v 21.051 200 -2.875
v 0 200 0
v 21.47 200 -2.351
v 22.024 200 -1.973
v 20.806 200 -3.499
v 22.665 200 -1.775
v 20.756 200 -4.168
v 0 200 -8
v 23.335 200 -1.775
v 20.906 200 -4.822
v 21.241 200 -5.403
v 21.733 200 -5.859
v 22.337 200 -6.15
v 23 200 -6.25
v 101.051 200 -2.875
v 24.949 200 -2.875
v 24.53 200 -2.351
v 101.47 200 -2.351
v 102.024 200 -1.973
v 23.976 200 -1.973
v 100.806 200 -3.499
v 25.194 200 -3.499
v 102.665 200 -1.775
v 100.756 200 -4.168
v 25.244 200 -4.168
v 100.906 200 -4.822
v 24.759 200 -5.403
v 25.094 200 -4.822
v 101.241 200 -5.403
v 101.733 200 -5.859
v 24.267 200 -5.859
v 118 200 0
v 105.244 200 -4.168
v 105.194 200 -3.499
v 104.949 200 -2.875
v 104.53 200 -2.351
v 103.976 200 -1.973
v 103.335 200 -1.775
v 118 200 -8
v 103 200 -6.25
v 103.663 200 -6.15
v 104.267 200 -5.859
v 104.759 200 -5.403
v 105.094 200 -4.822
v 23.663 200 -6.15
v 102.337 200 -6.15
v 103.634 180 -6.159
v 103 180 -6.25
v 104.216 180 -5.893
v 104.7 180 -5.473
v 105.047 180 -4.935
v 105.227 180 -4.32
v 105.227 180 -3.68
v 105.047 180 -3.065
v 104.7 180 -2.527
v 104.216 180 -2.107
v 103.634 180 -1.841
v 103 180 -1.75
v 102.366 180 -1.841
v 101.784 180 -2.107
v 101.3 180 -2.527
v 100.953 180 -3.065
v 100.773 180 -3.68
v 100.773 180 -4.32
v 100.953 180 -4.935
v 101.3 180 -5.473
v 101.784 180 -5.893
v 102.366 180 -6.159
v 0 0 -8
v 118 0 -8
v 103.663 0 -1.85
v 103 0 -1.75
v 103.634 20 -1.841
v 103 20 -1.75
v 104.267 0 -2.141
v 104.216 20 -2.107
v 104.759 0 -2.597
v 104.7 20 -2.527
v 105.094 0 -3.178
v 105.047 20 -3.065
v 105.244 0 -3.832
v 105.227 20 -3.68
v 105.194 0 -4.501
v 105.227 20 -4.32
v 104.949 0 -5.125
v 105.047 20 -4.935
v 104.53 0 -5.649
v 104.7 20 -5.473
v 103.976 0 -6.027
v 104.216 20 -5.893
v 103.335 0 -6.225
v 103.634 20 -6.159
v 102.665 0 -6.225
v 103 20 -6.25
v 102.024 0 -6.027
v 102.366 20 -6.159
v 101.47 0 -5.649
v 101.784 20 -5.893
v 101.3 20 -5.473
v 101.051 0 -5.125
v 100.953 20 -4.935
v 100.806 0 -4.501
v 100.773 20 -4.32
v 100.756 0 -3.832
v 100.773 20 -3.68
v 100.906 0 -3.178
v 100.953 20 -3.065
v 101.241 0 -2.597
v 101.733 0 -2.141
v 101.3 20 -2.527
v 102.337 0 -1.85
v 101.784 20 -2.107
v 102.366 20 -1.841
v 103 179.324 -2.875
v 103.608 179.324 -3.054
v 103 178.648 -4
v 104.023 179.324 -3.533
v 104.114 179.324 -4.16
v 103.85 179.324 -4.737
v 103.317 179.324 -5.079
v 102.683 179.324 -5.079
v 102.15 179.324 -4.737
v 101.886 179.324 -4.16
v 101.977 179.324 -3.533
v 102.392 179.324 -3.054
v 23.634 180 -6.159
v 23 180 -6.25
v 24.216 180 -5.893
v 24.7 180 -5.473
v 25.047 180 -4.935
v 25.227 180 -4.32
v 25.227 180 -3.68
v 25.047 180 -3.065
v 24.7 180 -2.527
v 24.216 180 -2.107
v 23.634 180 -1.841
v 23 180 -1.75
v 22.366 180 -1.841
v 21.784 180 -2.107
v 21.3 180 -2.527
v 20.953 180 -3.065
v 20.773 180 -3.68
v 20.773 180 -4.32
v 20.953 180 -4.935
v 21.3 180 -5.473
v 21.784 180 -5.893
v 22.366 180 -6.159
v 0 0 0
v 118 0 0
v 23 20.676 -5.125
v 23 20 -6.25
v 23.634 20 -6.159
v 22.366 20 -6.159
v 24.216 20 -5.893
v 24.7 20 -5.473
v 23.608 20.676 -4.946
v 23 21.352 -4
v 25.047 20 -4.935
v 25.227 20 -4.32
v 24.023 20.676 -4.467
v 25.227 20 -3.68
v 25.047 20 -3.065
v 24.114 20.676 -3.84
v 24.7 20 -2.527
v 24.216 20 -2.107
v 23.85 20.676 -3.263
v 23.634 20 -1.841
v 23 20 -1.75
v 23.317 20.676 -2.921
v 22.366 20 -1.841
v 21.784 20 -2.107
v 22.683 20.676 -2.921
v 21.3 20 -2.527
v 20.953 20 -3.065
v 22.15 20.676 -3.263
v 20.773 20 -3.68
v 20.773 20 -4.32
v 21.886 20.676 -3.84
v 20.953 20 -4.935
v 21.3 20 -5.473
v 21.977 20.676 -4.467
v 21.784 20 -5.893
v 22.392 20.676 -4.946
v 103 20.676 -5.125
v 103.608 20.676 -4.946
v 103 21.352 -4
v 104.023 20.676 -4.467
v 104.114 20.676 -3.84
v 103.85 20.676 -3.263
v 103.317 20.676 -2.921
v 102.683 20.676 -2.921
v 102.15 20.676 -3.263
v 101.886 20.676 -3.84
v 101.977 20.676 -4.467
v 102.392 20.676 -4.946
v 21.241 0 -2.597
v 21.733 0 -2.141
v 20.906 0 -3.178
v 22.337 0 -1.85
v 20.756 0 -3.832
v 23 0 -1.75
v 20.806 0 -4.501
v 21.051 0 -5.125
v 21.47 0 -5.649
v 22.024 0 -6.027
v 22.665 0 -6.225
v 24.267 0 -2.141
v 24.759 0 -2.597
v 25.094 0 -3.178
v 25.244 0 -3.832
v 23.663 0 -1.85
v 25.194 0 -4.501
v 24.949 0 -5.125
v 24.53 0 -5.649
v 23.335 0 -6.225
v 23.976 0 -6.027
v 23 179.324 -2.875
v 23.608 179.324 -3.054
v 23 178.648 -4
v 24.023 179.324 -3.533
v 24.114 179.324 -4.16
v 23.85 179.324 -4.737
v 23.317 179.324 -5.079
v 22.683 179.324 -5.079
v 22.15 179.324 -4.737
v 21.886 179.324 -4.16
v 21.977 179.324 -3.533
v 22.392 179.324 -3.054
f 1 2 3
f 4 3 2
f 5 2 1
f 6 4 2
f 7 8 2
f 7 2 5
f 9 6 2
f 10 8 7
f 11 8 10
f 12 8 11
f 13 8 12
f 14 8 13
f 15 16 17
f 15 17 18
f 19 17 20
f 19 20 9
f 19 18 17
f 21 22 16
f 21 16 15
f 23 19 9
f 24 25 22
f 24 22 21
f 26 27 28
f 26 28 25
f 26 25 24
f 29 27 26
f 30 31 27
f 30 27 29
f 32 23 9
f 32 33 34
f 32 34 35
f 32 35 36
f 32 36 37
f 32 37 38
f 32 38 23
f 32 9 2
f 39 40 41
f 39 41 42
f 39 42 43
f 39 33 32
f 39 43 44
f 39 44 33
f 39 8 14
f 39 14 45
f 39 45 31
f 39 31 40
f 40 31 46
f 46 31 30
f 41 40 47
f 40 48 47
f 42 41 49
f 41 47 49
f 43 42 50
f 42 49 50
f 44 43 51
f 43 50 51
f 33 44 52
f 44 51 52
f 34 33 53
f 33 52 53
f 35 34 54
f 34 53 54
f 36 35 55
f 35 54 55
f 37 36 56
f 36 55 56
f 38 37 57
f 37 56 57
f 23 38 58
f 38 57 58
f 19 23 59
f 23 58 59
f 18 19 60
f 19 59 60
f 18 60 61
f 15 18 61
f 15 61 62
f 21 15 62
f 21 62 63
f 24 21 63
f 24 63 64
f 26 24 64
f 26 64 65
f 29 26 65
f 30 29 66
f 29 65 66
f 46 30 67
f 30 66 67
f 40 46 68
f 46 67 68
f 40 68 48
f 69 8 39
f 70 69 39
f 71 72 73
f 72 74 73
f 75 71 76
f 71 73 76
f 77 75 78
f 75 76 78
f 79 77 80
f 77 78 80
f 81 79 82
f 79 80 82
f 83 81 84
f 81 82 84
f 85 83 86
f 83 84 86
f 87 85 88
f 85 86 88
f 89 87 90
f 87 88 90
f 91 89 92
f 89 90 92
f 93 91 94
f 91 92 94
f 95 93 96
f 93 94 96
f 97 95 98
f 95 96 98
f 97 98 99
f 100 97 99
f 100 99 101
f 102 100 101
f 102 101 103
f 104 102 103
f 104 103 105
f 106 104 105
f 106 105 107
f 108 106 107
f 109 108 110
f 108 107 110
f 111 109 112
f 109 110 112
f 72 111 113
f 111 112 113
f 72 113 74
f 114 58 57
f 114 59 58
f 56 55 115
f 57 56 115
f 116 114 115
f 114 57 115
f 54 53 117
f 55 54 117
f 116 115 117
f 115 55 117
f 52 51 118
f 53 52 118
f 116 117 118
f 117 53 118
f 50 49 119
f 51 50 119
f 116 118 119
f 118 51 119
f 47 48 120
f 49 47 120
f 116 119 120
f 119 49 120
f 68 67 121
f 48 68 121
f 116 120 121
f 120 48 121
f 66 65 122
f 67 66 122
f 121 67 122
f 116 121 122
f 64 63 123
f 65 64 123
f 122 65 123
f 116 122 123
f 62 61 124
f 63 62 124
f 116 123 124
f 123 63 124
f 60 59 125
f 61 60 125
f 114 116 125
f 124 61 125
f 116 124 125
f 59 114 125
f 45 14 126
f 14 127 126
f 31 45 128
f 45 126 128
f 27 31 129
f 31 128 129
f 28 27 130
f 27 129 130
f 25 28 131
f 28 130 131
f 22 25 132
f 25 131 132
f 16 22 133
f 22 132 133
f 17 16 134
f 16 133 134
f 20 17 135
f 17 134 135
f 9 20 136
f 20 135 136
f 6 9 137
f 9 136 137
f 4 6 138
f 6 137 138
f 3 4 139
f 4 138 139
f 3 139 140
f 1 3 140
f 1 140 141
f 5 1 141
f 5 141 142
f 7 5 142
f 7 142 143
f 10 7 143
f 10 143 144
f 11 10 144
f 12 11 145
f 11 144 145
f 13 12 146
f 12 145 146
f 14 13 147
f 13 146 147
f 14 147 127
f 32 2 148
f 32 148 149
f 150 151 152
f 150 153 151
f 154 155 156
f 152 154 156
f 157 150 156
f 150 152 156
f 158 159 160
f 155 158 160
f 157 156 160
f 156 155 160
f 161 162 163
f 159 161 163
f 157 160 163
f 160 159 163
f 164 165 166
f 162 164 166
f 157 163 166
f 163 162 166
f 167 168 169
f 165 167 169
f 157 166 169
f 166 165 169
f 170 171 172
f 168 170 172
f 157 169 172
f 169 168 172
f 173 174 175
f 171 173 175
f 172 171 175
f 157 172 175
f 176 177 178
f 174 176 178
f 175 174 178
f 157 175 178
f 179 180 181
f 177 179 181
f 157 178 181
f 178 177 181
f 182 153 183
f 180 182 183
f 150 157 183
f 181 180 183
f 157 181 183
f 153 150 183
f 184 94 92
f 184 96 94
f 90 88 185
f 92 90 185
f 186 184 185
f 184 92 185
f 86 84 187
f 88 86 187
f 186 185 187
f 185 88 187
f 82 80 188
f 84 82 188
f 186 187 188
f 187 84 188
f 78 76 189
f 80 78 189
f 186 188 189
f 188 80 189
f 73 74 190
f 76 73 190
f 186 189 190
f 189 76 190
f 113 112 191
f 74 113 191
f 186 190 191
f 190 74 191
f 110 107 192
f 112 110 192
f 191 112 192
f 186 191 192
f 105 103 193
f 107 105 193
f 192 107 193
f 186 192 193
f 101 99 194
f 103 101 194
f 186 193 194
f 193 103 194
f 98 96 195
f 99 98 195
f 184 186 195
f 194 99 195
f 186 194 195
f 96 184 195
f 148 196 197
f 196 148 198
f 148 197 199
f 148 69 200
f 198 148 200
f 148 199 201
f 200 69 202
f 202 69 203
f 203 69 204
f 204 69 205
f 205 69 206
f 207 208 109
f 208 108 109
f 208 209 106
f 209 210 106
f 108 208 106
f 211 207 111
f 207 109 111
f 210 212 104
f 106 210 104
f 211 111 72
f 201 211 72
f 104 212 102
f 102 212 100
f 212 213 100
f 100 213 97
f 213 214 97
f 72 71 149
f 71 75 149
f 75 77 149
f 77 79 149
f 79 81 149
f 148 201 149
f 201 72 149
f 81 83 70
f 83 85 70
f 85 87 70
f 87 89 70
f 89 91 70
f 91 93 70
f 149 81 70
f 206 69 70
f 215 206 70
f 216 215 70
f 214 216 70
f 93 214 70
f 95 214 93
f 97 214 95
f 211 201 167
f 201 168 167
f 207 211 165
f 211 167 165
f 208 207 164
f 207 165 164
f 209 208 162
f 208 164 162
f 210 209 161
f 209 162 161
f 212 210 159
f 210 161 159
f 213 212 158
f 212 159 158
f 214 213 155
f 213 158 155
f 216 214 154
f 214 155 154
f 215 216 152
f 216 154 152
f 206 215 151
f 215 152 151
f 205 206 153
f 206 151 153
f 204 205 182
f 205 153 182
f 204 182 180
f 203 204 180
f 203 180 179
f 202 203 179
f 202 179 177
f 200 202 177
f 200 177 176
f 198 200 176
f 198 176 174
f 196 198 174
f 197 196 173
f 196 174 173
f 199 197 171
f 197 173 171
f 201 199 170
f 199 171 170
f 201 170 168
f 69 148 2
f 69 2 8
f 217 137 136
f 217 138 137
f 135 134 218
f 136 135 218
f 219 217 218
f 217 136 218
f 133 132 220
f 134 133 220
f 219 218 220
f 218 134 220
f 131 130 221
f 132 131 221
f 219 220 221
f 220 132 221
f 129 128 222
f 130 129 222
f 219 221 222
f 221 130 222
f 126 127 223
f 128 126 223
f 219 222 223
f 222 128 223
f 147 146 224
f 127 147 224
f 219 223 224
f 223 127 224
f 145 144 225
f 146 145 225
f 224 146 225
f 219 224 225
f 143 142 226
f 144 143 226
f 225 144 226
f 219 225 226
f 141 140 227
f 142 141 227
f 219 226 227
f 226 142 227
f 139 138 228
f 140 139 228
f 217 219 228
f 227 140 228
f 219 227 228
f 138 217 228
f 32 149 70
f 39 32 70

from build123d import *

# Parameters (mm, degrees)
SKETCH1_W                      = 118
SKETCH1_H                      = 8
EXTRUDE1_DEPTH                 = 200
F_4_5_4_5_DIAMETER_HOLE1_D     = 4.5
F_4_5_4_5_DIAMETER_HOLE1_DEPTH = 20
F_4_5_4_5_DIAMETER_HOLE1_TIP   = 1.351936393
F_4_5_4_5_DIAMETER_HOLE2_D     = 4.5
F_4_5_4_5_DIAMETER_HOLE2_DEPTH = 20
F_4_5_4_5_DIAMETER_HOLE2_TIP   = 1.351936393


with BuildPart() as part:
    # Sketch1 → Extrude1 (new body)
    with BuildSketch(Plane(origin=(0, 0, 0), x_dir=(1, 0, 0), z_dir=(0, 1, 0))):
        with Locations((59, 4)):
            Rectangle(SKETCH1_W, SKETCH1_H)
    extrude(amount=EXTRUDE1_DEPTH)

    # Ø4.5 (4.5) Diameter Hole1
    with Locations(Plane(origin=(23, 200, -4), x_dir=(0, 0, 1), z_dir=(0, 1, 0))):
        with Locations((0, 0), (0, 80)):
            Hole(F_4_5_4_5_DIAMETER_HOLE1_D / 2, depth=F_4_5_4_5_DIAMETER_HOLE1_DEPTH)
            with Locations((0, 0, -(F_4_5_4_5_DIAMETER_HOLE1_DEPTH + F_4_5_4_5_DIAMETER_HOLE1_TIP / 2))):  # 118° drill point
                Cone(0, F_4_5_4_5_DIAMETER_HOLE1_D / 2, F_4_5_4_5_DIAMETER_HOLE1_TIP, mode=Mode.SUBTRACT)

    # Ø4.5 (4.5) Diameter Hole2
    with Locations(Plane(origin=(23, 0, -4), x_dir=(0, 0, -1), z_dir=(0, -1, 0))):
        with Locations((0, 0), (0, 80)):
            Hole(F_4_5_4_5_DIAMETER_HOLE2_D / 2, depth=F_4_5_4_5_DIAMETER_HOLE2_DEPTH)
            with Locations((0, 0, -(F_4_5_4_5_DIAMETER_HOLE2_DEPTH + F_4_5_4_5_DIAMETER_HOLE2_TIP / 2))):  # 118° drill point
                Cone(0, F_4_5_4_5_DIAMETER_HOLE2_D / 2, F_4_5_4_5_DIAMETER_HOLE2_TIP, mode=Mode.SUBTRACT)


solid = part.part
